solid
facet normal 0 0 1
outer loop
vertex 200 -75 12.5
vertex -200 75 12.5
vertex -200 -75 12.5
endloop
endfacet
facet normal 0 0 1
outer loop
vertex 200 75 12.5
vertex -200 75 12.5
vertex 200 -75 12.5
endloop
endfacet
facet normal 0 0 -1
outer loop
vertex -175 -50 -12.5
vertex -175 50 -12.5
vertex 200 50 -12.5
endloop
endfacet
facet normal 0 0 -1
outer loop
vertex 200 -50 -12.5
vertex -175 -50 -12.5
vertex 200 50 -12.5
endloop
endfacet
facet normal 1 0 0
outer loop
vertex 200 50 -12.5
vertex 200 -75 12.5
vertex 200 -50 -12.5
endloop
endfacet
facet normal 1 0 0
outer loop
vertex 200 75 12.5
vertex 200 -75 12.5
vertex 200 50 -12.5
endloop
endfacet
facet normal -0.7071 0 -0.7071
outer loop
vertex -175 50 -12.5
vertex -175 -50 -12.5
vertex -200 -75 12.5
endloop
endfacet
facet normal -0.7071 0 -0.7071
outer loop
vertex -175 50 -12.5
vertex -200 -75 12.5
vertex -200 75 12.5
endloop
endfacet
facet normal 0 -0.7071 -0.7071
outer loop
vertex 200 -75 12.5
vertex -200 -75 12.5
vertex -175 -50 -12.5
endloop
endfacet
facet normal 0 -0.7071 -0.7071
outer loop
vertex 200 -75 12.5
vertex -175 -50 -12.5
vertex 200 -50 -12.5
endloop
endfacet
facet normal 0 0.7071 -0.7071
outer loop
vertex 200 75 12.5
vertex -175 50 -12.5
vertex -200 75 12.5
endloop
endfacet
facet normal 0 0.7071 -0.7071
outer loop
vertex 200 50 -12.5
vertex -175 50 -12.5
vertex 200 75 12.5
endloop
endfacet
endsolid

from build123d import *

# Parameters (mm, degrees)
F0_W     = 400
F0_H     = 150
F1_DEPTH = 12.5
F2_SIZE  = 24.99999


# Not quite as in the source:
# - a fillet or chamfer is up to 0.001 mm smaller than in the source, because OpenCascade refuses the exact size


with BuildPart() as f1:
    # F0 (on Top) → F1 (new body, symmetric)
    with BuildSketch(Plane.XY):
        Rectangle(F0_W, F0_H)
    extrude(amount=F1_DEPTH, both=True)

    # F2 (size 25 in the source; OpenCascade refuses exactly that, so slightly less here)
    f2_edges = [f1.edges().sort_by_distance(p)[0] for p in [
        (0, 75, -12.5),
        (-200, 0, -12.5),
        (0, -75, -12.5),
    ]]
    chamfer(f2_edges, length=F2_SIZE)


solid = f1.part
